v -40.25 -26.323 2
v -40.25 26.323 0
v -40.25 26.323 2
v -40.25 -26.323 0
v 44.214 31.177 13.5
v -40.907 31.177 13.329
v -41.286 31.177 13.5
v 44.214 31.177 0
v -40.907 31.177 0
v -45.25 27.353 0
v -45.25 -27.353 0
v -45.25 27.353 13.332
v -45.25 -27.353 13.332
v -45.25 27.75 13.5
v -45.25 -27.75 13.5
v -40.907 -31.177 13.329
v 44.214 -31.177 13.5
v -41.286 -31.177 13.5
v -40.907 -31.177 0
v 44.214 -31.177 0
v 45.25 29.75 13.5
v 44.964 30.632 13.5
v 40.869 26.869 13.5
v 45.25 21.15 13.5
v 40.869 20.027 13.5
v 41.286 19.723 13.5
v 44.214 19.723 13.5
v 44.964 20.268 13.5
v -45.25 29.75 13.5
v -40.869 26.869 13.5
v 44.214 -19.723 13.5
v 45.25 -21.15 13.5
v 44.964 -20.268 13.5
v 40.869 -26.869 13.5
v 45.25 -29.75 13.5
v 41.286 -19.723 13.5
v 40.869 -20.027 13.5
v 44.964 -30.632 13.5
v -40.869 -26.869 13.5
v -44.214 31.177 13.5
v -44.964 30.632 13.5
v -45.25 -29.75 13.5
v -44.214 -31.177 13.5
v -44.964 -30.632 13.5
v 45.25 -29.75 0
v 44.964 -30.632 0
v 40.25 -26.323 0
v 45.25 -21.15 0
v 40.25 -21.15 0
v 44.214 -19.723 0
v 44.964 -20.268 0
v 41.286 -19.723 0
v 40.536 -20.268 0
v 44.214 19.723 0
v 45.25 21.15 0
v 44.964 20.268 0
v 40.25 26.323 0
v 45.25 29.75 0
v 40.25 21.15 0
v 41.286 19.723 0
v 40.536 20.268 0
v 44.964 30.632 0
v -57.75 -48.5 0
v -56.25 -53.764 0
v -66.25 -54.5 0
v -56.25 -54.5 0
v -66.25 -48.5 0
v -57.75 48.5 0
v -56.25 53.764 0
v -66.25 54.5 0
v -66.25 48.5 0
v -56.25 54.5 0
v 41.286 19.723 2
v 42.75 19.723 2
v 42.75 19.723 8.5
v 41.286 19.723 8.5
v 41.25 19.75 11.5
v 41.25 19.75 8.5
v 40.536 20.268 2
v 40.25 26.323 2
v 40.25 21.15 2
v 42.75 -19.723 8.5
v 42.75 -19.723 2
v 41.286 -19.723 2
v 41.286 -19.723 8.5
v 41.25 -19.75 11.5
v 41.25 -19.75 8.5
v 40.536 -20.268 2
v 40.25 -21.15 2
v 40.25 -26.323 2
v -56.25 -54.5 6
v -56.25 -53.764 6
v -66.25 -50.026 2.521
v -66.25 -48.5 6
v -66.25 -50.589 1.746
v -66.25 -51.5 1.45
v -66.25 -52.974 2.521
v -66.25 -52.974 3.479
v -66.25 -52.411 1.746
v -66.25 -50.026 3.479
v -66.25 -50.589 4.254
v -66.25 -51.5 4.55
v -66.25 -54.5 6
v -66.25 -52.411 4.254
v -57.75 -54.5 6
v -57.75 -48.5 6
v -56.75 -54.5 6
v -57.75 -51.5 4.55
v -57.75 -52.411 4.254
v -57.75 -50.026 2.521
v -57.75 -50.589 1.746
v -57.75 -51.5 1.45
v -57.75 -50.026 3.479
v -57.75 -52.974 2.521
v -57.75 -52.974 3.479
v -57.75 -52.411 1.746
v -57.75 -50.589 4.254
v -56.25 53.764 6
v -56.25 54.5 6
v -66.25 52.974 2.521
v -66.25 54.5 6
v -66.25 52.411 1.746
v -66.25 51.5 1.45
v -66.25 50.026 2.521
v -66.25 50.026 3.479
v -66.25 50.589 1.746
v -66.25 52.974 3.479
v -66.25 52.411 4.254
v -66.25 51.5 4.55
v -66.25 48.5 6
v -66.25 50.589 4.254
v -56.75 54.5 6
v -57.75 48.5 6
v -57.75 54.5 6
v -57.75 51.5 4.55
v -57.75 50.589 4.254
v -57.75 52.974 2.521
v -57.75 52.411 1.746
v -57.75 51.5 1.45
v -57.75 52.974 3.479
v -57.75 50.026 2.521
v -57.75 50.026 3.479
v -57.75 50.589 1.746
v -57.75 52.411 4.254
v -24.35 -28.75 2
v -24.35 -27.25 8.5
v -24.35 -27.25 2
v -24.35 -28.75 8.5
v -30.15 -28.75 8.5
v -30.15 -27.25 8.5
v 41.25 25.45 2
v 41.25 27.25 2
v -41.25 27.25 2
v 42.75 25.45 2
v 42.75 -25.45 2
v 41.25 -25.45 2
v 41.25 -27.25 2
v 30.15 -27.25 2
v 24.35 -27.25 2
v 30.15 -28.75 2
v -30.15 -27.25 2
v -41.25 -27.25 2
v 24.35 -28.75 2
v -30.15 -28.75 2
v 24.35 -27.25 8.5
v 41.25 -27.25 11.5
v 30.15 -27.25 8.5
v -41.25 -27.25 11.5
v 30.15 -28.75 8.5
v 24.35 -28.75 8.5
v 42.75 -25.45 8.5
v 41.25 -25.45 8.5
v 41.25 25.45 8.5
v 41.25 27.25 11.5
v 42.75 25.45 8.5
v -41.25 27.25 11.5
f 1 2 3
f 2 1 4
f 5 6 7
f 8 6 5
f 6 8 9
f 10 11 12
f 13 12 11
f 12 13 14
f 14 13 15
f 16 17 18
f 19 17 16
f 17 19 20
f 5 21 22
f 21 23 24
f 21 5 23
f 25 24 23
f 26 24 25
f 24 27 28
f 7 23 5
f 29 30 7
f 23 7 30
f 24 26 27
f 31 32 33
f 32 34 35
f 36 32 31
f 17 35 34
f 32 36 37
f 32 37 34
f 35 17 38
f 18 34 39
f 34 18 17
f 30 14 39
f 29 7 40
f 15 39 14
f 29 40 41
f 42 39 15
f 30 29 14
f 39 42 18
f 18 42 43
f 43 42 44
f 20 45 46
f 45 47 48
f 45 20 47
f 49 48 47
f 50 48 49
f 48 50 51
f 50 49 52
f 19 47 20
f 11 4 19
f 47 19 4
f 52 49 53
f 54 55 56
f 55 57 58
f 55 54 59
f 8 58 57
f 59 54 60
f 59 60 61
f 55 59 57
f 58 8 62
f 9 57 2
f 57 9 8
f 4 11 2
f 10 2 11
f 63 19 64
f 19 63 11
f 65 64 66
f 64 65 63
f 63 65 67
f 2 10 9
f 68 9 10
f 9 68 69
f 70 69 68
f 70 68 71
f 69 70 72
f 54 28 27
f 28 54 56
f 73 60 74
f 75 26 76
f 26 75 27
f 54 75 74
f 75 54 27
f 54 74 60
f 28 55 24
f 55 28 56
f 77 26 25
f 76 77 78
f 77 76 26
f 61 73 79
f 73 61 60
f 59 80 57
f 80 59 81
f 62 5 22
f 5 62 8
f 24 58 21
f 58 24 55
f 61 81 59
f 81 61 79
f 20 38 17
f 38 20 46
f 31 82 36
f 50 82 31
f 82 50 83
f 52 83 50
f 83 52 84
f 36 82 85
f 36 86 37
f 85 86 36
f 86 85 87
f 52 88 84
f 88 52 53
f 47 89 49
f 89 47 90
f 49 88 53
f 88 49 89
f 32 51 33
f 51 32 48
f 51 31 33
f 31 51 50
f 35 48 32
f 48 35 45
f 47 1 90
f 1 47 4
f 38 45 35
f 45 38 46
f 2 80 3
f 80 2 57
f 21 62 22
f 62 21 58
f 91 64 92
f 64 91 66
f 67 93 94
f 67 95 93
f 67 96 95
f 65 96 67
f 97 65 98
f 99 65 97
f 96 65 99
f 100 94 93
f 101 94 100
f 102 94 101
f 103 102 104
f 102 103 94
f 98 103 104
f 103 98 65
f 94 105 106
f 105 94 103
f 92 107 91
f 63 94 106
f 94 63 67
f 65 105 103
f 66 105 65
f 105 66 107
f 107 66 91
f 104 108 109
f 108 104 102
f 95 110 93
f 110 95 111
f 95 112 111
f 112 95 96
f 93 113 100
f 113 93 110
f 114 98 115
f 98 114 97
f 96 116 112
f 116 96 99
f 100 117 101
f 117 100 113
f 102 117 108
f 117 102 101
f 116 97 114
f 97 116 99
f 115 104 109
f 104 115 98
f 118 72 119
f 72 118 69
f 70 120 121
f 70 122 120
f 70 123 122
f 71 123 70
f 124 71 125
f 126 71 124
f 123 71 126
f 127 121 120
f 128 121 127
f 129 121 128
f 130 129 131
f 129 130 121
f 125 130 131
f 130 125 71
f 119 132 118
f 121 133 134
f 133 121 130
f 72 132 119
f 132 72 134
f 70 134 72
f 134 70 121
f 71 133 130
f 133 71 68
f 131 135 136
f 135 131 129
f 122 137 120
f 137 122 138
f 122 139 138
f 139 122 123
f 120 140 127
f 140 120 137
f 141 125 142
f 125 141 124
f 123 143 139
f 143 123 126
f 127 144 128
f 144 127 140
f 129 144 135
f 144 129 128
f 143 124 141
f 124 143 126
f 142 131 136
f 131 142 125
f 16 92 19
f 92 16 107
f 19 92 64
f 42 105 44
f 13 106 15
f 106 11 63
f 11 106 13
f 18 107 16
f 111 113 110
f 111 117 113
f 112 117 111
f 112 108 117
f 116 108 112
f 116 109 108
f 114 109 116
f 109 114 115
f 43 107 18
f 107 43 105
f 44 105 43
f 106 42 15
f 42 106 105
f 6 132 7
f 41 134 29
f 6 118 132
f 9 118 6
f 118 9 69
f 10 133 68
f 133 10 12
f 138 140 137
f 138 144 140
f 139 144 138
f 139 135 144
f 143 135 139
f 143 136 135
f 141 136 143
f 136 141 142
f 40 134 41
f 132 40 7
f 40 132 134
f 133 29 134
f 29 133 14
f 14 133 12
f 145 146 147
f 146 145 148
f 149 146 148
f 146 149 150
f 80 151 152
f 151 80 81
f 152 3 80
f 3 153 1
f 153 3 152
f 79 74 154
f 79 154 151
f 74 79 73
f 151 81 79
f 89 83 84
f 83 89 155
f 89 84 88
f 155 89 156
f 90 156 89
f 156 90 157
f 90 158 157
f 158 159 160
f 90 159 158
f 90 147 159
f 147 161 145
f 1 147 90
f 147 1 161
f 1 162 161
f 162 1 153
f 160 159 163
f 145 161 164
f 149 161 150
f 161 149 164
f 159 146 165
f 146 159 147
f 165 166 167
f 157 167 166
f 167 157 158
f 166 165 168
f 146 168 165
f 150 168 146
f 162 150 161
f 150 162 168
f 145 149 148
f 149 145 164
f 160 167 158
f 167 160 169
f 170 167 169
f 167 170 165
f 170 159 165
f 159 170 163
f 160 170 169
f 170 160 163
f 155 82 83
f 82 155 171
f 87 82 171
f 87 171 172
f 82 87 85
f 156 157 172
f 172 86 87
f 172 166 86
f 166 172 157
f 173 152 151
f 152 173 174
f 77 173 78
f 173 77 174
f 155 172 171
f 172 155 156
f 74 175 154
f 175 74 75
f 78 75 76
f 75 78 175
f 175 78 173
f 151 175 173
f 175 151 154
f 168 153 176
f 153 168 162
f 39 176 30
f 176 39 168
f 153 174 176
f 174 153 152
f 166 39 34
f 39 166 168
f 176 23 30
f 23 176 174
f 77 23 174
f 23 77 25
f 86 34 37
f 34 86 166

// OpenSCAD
// first stab at a generalized pcb holder for modular synths
// 3-clause BSD, jef@slechte.info, 2020

// 90x70 stripboard
pcb_t = 1.5;
pcb_h = 90.1;
pcb_d = 70.1;

// 70x50 stripboard
pcb_t = 1.5;
pcb_h = 70.1;
pcb_d = 50.1;

// small MB102 breadboard
pcb_t = 9.5;
pcb_h = 54.5;
pcb_d = 82.5;
// breadboard has five notches
notch_w = 3.8 + 2;
notch_h = 4.5 + 2;
notch_d = 1.5;
// with their centers this long from the
// edge of the breadboard
notch_offset_long = 14;	// long side of breadboard
notch_offset_short = 4.7;	// short side

bolt_r = 3.1/2;
front_plate_bolt_distance = 103;
front_plate_mount_block_s = 6;
front_plate_mount_block_d = 10;

plate_pcb_offset = 20;

rounded_corners_r = 1.5;

latch = notch_offset_short + notch_w/2;

lip_w = 1;
rail_w = 4;

lip_t = lip_w;
bottom_t = 2;
top_t = 1;

$fn = 10;
/*
 *   +---------------+  \
 *   |               |   ) top_t
 *   |               |  /
 *   |              /   \
 *   |            /      ) lip_t
 *   |          /       /
 *   |         |        \
 *   |         |         ) pcb_t
 *   |         |        /
 *   |         +-----+  \
 *   |               |   ) bottom_t
 *   +---------------+  /
 *    \        /\    /
 *      rail_w  lip_w
*/
 
module pcb_cutout() {
    lip_d = pcb_d - (2*lip_w);
    lip_h = pcb_h - (2*lip_w);
	
	translate([0, 0, bottom_t + (pcb_t/2)]) {
		hull() {
			cube([pcb_d, pcb_h, pcb_t], center=true);    
			translate([0, 0, pcb_t])
				cube([lip_d, lip_h, lip_t], center=true);
		}
	}
	translate([0, 0, bottom_t + (notch_h/2)]) {
		for (long_side = [ -1, 1 ]) {
			// pull to their lengthwise positions
			translate([long_side*(pcb_d/2-notch_offset_long), 0, 0])
				// pull to outside of breadboard
				translate([0, -(pcb_h/2+notch_d/2), 0])
					cube([notch_w, notch_d, notch_h], center=true);
		}
		for (short_side = [ -1, 0, 1]) {
			// pull to their depthwise positions (three!)
			translate([0, short_side*(pcb_h/2-notch_offset_short), 0])
				// pull to outside of breadboard
				translate([pcb_d/2+notch_d/2, 0, 0])
					cube([notch_d, notch_w, notch_h], center=true);
		}
	}
}

module rounded_cube(coords) {
	r = rounded_corners_r;
	hull() {
		for (a = [ -1, 1 ]) {
			for (b = [ -1, 1 ]) {
				translate([a*(coords[0]/2-r), b*(coords[1]/2-r), 0])
					cylinder(r=r, h=coords[2], center=true);
			}
		}
	}
}
module rails() {
    total_t = bottom_t + pcb_t + lip_t + top_t;
    total_w = rail_w + lip_w;
    total_pcb_d = pcb_d;
    total_pcb_h = pcb_h;// + 2*latch;
	// a nudge is defined as the difference between the
	// half of a rail and the lip insection in the rail
	a_nudge = total_w/2 - lip_w;
	
	// everything up so our bottom edge is on the XY plane
	if (0) {
    translate([0, 0, total_t/2]) {
        // front
		front_length = pcb_h + rail_w*2;
        translate([-(pcb_d/2+a_nudge), 0, 0])
			rounded_cube([total_w, front_length, total_t]);
        
        // back
		back_length = latch + rail_w;
        translate([+(pcb_d/2+a_nudge), 0, 0])
			translate([0, +(pcb_h/2-(back_length)/2+rail_w), 0])
				rounded_cube([total_w, back_length, total_t]);
        
        // bottom
		bottom_length = latch + rail_w;
        translate([-(pcb_d/2-(bottom_length)/2+rail_w), -(pcb_h/2+a_nudge), 0])
			rounded_cube([bottom_length, total_w, total_t]);
    
        // top
		top_length = pcb_d + rail_w*2; //latch + rail_w;
		translate([0, (pcb_h/2+a_nudge), 0])
			rounded_cube([top_length, total_w, total_t]);
		
    }
	} else {
    translate([0, 0, total_t/2]) {
        // front
		front_length = pcb_h + rail_w*2;
        translate([-(pcb_d/2+a_nudge), 0, 0])
			rounded_cube([total_w, front_length, total_t]);
        
        // back top
		back_length = latch + rail_w;
        translate([+(pcb_d/2+a_nudge), 0, 0])
			translate([0, +(pcb_h/2-(back_length)/2+rail_w), 0])
				rounded_cube([total_w, back_length, total_t]);
		// back bottom
        translate([+(pcb_d/2+a_nudge), 0, 0])
			translate([0, -(pcb_h/2-(back_length)/2+rail_w), 0])
				rounded_cube([total_w, back_length, total_t]);   
		
        // bottom
		bottom_length = pcb_d + rail_w*2;
        translate([0, -(pcb_h/2+a_nudge), 0])
			rounded_cube([bottom_length, total_w, total_t]);
    
        // top
		top_length = pcb_d + rail_w*2; //latch + rail_w;
		translate([0, (pcb_h/2+a_nudge), 0])
			rounded_cube([top_length, total_w, total_t]);
	}
    }	
}
module rails_top() {
    total_t = bottom_t + pcb_t + lip_t + top_t;
    total_w = rail_w + lip_w;
    total_pcb_d = pcb_d;
    total_pcb_h = pcb_h;// + 2*latch;
	// a nudge is defined as the difference between the
	// half of a rail and the lip insection in the rail
	a_nudge = total_w/2 - lip_w;
	
	// everything up so our bottom edge is on the XY plane
    translate([0, 0, total_t/2]) {
		translate([-(pcb_d/2+a_nudge), -(pcb_h/2+a_nudge), 0])
			rounded_cube([total_w, total_w, total_t]);
    }
}
module rails_bottom() {
    total_t = bottom_t + pcb_t + lip_t + top_t;
    total_w = rail_w + lip_w;
    total_pcb_d = pcb_d;
    total_pcb_h = pcb_h;// + 2*latch;
	// a nudge is defined as the difference between the
	// half of a rail and the lip insection in the rail
	a_nudge = total_w/2 - lip_w;
	
	// everything up so our bottom edge is on the XY plane
    translate([0, 0, total_t/2]) {
		translate([-(pcb_d/2+a_nudge), +(pcb_h/2+a_nudge), 0])
			rounded_cube([total_w, total_w, total_t]);
    }
} 
module front_plate_mounting() {

	block_s = front_plate_mount_block_s;
	block_d = front_plate_mount_block_d;

	translate([
	 -(pcb_d/2 + plate_pcb_offset),
	 0,
	 block_s/2])
	 
	rotate([0, 90, 0])
	for (side = [-1, 1]) {
		translate([0, front_plate_bolt_distance/2*side, 0])
			difference() {
				cube([block_s, block_s, block_d], center=true);
				cylinder(r=bolt_r, h=block_d, center=true);
			}
	}
	 
}
module front_plate_mounting_slice_top() {

	block_s = front_plate_mount_block_s;
	block_d = front_plate_mount_block_d;
	slice_d = 1;

	translate([
	 -(pcb_d/2 + plate_pcb_offset),
	 0,
	 block_s/2])
	 
	rotate([0, 90, 0]) {
		side = -1;
		translate([0, front_plate_bolt_distance/2*side,
			(block_d/2-slice_d/1)])
			cube([block_s, block_s, slice_d], center=true);
	}
	 
 }
module front_plate_mounting_slice_bottom() {

	block_s = front_plate_mount_block_s;
	block_d = front_plate_mount_block_d;
	slice_d = 1;

	translate([
	 -(pcb_d/2 + plate_pcb_offset),
	 0,
	 block_s/2])
	 
	rotate([0, 90, 0]) {
		side = 1;
		translate([0, front_plate_bolt_distance/2*side,
			(block_d/2-slice_d/1)])
			cube([block_s, block_s, slice_d], center=true);
	}
	 
 }
 
difference() {
	union() {
		rails();
		front_plate_mounting();
		hull() {
			rails_top();
			front_plate_mounting_slice_top();
		}
		hull() {
			rails_bottom();
			front_plate_mounting_slice_bottom();
		}
	}
	pcb_cutout();
}
